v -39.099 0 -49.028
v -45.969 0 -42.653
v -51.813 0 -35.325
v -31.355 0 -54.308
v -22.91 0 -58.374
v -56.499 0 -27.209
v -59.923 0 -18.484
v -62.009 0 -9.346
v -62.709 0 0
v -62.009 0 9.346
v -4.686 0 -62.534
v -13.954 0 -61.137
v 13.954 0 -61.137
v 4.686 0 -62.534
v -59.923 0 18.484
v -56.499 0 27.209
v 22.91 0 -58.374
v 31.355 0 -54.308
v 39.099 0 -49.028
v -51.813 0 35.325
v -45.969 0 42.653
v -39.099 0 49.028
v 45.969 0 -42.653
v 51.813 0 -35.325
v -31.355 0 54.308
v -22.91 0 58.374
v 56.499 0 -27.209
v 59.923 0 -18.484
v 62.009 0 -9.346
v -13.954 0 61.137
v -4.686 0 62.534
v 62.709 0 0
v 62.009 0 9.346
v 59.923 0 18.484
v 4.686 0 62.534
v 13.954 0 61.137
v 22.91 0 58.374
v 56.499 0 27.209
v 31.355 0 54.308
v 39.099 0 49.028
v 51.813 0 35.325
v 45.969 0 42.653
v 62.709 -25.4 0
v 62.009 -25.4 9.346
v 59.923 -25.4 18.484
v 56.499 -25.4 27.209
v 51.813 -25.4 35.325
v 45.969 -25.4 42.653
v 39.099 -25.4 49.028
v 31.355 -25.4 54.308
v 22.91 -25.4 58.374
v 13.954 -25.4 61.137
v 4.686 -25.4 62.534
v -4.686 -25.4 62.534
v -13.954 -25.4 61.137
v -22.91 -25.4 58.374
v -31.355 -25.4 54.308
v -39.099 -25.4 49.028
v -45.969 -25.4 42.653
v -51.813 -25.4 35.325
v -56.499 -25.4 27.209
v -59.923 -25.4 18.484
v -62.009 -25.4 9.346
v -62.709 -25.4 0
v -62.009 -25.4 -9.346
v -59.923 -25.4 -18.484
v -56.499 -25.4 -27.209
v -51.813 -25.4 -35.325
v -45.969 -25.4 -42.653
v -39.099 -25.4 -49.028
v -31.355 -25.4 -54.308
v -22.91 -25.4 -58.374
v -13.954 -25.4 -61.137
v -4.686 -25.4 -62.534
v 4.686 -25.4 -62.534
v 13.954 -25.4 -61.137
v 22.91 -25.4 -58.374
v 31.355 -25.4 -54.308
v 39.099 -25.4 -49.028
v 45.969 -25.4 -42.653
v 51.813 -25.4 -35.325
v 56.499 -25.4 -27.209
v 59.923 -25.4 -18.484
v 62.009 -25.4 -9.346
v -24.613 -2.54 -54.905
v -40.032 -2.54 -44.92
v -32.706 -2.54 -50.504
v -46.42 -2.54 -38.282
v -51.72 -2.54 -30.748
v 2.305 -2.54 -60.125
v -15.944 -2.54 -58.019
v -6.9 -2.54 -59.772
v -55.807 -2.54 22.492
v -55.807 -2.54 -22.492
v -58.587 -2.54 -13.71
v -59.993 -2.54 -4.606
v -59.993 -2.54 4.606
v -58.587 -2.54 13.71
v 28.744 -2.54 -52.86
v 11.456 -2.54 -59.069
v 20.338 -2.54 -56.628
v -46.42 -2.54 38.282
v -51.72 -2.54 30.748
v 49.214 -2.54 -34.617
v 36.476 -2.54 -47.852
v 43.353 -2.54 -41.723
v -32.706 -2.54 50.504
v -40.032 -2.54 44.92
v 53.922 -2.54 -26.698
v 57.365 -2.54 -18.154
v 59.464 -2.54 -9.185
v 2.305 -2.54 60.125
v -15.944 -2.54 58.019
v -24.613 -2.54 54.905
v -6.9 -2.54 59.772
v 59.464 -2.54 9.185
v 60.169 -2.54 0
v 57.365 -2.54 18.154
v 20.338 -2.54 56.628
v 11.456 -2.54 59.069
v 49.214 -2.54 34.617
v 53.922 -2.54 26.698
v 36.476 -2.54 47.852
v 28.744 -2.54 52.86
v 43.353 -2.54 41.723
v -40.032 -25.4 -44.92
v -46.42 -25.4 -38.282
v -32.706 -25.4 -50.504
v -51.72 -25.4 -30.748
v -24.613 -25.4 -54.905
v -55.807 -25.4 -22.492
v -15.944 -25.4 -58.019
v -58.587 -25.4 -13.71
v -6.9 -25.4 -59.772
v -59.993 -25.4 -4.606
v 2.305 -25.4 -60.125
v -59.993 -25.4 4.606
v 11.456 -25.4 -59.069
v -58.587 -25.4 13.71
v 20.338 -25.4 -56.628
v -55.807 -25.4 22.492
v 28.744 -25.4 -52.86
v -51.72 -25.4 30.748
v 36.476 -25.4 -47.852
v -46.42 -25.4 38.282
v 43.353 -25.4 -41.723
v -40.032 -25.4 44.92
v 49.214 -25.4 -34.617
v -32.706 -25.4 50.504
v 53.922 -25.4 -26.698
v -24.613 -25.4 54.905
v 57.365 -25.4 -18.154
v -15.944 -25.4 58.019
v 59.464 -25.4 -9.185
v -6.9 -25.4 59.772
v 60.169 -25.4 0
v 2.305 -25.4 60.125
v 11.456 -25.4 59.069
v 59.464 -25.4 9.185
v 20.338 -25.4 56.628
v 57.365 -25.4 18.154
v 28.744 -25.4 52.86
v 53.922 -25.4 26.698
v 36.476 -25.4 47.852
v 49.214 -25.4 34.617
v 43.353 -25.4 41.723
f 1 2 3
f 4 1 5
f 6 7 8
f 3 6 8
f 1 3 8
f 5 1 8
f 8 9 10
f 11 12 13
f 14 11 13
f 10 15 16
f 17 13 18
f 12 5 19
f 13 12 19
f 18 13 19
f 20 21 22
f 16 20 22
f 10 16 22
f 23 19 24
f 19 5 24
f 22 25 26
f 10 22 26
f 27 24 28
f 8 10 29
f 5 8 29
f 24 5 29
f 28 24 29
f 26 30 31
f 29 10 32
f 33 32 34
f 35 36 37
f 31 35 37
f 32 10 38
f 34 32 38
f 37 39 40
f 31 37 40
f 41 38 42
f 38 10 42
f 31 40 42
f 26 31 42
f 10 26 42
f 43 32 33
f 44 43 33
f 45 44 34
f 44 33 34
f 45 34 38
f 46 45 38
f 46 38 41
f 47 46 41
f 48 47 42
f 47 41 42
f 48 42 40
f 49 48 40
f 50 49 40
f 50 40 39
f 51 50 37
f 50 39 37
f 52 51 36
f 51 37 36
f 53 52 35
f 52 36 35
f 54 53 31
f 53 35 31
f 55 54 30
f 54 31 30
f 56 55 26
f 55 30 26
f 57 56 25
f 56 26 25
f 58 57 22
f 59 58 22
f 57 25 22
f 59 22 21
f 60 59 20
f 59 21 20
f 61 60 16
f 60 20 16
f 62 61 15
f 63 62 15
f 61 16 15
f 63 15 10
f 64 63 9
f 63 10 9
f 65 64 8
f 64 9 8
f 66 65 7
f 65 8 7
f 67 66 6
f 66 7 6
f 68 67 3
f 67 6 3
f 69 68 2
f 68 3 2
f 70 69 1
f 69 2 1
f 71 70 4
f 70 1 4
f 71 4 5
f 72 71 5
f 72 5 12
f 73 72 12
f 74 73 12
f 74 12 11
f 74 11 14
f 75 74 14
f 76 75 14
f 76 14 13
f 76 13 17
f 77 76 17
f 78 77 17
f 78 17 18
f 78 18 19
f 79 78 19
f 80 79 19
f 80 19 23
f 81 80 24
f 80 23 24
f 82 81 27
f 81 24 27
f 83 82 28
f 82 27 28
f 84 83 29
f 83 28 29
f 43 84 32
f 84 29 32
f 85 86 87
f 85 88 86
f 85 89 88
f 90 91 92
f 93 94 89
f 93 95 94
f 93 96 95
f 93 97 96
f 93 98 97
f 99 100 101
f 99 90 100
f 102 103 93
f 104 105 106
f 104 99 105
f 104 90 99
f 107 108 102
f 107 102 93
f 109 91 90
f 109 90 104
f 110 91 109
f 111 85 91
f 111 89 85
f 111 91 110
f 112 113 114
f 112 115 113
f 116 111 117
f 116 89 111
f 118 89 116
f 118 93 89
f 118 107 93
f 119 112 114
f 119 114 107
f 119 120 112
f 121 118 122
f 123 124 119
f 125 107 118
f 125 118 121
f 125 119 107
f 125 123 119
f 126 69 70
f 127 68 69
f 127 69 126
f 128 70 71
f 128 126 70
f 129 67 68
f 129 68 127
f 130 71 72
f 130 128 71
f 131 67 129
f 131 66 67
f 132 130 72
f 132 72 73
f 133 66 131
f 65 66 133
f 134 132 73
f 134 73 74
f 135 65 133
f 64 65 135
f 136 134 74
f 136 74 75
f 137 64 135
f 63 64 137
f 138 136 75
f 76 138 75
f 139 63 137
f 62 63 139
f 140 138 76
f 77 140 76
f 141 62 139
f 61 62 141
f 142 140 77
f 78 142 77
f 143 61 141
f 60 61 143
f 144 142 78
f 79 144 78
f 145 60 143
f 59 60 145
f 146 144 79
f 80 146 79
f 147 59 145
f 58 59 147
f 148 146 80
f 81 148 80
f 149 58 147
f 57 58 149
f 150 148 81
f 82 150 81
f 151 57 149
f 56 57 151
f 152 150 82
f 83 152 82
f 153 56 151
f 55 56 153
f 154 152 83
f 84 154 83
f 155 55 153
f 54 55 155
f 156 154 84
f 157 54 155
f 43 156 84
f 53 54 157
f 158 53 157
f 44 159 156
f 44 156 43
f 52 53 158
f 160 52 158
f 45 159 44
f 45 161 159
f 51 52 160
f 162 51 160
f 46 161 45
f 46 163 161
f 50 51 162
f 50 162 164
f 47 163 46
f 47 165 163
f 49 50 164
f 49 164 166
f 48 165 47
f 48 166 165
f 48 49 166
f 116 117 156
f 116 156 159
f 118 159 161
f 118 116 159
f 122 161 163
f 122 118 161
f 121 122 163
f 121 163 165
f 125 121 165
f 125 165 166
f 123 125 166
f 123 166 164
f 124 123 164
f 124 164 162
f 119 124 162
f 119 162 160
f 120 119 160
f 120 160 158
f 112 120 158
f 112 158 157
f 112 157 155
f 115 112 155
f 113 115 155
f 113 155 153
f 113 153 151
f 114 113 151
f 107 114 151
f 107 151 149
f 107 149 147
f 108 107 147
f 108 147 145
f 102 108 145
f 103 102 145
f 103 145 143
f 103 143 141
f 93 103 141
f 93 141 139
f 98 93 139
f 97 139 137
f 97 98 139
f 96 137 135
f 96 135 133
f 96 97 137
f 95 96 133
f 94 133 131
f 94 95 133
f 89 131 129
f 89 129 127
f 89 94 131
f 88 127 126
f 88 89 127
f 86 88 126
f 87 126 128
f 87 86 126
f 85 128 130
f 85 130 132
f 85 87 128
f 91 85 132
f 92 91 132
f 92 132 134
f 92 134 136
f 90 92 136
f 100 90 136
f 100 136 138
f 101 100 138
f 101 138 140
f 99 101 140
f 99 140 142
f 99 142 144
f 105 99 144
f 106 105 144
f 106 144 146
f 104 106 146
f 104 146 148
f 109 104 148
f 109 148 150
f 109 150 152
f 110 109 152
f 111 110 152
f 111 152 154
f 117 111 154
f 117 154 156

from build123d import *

# Parameters (mm, degrees)
F1_DEPTH = 25.4
F3_R     = 39.2915838244
F4_DEPTH = 25.4
F6_R     = 62.7093604839
F7_DEPTH = 25.4
F8_T     = -2.54


with BuildPart() as f1:
    # F0 (on Front) → F1 (new body)
    with BuildSketch(Plane.XZ):
        with BuildLine():
            add(Edge.make_bspline(
                [(-55.208299309, 58.1508763134), (-67.0164708846, 55.3175541912), (-87.6445105915, -47.0922011076), (101.1268779134, 10.7779345683), (-19.4909088182, 79.2065756794), (-30.9714891326, 30.3974201797), (-47.8340446405, 59.9202983407), (-55.208299309, 58.1508763134)],
                knots=[0, 0, 0, 0, 0.2192278895, 0.4966401959, 0.7260839501, 0.8630912265, 1, 1, 1, 1], degree=3))
        make_face()
    extrude(amount=F1_DEPTH)


with BuildPart() as f4:
    # F3 (on Front) → F4 (new body)
    with BuildSketch(Plane.XZ):
        Circle(F3_R)
    extrude(amount=F4_DEPTH)


with BuildPart() as f7:
    # F6 (on Front) → F7 (new body)
    with BuildSketch(Plane.XZ):
        Circle(F6_R)
    extrude(amount=F7_DEPTH)

    # F8
    f8_openings = [f7.faces().sort_by_distance(p)[0] for p in [
        (0, -25.4, 0),
    ]]
    offset(amount=F8_T, openings=f8_openings)


solid = f7.part
